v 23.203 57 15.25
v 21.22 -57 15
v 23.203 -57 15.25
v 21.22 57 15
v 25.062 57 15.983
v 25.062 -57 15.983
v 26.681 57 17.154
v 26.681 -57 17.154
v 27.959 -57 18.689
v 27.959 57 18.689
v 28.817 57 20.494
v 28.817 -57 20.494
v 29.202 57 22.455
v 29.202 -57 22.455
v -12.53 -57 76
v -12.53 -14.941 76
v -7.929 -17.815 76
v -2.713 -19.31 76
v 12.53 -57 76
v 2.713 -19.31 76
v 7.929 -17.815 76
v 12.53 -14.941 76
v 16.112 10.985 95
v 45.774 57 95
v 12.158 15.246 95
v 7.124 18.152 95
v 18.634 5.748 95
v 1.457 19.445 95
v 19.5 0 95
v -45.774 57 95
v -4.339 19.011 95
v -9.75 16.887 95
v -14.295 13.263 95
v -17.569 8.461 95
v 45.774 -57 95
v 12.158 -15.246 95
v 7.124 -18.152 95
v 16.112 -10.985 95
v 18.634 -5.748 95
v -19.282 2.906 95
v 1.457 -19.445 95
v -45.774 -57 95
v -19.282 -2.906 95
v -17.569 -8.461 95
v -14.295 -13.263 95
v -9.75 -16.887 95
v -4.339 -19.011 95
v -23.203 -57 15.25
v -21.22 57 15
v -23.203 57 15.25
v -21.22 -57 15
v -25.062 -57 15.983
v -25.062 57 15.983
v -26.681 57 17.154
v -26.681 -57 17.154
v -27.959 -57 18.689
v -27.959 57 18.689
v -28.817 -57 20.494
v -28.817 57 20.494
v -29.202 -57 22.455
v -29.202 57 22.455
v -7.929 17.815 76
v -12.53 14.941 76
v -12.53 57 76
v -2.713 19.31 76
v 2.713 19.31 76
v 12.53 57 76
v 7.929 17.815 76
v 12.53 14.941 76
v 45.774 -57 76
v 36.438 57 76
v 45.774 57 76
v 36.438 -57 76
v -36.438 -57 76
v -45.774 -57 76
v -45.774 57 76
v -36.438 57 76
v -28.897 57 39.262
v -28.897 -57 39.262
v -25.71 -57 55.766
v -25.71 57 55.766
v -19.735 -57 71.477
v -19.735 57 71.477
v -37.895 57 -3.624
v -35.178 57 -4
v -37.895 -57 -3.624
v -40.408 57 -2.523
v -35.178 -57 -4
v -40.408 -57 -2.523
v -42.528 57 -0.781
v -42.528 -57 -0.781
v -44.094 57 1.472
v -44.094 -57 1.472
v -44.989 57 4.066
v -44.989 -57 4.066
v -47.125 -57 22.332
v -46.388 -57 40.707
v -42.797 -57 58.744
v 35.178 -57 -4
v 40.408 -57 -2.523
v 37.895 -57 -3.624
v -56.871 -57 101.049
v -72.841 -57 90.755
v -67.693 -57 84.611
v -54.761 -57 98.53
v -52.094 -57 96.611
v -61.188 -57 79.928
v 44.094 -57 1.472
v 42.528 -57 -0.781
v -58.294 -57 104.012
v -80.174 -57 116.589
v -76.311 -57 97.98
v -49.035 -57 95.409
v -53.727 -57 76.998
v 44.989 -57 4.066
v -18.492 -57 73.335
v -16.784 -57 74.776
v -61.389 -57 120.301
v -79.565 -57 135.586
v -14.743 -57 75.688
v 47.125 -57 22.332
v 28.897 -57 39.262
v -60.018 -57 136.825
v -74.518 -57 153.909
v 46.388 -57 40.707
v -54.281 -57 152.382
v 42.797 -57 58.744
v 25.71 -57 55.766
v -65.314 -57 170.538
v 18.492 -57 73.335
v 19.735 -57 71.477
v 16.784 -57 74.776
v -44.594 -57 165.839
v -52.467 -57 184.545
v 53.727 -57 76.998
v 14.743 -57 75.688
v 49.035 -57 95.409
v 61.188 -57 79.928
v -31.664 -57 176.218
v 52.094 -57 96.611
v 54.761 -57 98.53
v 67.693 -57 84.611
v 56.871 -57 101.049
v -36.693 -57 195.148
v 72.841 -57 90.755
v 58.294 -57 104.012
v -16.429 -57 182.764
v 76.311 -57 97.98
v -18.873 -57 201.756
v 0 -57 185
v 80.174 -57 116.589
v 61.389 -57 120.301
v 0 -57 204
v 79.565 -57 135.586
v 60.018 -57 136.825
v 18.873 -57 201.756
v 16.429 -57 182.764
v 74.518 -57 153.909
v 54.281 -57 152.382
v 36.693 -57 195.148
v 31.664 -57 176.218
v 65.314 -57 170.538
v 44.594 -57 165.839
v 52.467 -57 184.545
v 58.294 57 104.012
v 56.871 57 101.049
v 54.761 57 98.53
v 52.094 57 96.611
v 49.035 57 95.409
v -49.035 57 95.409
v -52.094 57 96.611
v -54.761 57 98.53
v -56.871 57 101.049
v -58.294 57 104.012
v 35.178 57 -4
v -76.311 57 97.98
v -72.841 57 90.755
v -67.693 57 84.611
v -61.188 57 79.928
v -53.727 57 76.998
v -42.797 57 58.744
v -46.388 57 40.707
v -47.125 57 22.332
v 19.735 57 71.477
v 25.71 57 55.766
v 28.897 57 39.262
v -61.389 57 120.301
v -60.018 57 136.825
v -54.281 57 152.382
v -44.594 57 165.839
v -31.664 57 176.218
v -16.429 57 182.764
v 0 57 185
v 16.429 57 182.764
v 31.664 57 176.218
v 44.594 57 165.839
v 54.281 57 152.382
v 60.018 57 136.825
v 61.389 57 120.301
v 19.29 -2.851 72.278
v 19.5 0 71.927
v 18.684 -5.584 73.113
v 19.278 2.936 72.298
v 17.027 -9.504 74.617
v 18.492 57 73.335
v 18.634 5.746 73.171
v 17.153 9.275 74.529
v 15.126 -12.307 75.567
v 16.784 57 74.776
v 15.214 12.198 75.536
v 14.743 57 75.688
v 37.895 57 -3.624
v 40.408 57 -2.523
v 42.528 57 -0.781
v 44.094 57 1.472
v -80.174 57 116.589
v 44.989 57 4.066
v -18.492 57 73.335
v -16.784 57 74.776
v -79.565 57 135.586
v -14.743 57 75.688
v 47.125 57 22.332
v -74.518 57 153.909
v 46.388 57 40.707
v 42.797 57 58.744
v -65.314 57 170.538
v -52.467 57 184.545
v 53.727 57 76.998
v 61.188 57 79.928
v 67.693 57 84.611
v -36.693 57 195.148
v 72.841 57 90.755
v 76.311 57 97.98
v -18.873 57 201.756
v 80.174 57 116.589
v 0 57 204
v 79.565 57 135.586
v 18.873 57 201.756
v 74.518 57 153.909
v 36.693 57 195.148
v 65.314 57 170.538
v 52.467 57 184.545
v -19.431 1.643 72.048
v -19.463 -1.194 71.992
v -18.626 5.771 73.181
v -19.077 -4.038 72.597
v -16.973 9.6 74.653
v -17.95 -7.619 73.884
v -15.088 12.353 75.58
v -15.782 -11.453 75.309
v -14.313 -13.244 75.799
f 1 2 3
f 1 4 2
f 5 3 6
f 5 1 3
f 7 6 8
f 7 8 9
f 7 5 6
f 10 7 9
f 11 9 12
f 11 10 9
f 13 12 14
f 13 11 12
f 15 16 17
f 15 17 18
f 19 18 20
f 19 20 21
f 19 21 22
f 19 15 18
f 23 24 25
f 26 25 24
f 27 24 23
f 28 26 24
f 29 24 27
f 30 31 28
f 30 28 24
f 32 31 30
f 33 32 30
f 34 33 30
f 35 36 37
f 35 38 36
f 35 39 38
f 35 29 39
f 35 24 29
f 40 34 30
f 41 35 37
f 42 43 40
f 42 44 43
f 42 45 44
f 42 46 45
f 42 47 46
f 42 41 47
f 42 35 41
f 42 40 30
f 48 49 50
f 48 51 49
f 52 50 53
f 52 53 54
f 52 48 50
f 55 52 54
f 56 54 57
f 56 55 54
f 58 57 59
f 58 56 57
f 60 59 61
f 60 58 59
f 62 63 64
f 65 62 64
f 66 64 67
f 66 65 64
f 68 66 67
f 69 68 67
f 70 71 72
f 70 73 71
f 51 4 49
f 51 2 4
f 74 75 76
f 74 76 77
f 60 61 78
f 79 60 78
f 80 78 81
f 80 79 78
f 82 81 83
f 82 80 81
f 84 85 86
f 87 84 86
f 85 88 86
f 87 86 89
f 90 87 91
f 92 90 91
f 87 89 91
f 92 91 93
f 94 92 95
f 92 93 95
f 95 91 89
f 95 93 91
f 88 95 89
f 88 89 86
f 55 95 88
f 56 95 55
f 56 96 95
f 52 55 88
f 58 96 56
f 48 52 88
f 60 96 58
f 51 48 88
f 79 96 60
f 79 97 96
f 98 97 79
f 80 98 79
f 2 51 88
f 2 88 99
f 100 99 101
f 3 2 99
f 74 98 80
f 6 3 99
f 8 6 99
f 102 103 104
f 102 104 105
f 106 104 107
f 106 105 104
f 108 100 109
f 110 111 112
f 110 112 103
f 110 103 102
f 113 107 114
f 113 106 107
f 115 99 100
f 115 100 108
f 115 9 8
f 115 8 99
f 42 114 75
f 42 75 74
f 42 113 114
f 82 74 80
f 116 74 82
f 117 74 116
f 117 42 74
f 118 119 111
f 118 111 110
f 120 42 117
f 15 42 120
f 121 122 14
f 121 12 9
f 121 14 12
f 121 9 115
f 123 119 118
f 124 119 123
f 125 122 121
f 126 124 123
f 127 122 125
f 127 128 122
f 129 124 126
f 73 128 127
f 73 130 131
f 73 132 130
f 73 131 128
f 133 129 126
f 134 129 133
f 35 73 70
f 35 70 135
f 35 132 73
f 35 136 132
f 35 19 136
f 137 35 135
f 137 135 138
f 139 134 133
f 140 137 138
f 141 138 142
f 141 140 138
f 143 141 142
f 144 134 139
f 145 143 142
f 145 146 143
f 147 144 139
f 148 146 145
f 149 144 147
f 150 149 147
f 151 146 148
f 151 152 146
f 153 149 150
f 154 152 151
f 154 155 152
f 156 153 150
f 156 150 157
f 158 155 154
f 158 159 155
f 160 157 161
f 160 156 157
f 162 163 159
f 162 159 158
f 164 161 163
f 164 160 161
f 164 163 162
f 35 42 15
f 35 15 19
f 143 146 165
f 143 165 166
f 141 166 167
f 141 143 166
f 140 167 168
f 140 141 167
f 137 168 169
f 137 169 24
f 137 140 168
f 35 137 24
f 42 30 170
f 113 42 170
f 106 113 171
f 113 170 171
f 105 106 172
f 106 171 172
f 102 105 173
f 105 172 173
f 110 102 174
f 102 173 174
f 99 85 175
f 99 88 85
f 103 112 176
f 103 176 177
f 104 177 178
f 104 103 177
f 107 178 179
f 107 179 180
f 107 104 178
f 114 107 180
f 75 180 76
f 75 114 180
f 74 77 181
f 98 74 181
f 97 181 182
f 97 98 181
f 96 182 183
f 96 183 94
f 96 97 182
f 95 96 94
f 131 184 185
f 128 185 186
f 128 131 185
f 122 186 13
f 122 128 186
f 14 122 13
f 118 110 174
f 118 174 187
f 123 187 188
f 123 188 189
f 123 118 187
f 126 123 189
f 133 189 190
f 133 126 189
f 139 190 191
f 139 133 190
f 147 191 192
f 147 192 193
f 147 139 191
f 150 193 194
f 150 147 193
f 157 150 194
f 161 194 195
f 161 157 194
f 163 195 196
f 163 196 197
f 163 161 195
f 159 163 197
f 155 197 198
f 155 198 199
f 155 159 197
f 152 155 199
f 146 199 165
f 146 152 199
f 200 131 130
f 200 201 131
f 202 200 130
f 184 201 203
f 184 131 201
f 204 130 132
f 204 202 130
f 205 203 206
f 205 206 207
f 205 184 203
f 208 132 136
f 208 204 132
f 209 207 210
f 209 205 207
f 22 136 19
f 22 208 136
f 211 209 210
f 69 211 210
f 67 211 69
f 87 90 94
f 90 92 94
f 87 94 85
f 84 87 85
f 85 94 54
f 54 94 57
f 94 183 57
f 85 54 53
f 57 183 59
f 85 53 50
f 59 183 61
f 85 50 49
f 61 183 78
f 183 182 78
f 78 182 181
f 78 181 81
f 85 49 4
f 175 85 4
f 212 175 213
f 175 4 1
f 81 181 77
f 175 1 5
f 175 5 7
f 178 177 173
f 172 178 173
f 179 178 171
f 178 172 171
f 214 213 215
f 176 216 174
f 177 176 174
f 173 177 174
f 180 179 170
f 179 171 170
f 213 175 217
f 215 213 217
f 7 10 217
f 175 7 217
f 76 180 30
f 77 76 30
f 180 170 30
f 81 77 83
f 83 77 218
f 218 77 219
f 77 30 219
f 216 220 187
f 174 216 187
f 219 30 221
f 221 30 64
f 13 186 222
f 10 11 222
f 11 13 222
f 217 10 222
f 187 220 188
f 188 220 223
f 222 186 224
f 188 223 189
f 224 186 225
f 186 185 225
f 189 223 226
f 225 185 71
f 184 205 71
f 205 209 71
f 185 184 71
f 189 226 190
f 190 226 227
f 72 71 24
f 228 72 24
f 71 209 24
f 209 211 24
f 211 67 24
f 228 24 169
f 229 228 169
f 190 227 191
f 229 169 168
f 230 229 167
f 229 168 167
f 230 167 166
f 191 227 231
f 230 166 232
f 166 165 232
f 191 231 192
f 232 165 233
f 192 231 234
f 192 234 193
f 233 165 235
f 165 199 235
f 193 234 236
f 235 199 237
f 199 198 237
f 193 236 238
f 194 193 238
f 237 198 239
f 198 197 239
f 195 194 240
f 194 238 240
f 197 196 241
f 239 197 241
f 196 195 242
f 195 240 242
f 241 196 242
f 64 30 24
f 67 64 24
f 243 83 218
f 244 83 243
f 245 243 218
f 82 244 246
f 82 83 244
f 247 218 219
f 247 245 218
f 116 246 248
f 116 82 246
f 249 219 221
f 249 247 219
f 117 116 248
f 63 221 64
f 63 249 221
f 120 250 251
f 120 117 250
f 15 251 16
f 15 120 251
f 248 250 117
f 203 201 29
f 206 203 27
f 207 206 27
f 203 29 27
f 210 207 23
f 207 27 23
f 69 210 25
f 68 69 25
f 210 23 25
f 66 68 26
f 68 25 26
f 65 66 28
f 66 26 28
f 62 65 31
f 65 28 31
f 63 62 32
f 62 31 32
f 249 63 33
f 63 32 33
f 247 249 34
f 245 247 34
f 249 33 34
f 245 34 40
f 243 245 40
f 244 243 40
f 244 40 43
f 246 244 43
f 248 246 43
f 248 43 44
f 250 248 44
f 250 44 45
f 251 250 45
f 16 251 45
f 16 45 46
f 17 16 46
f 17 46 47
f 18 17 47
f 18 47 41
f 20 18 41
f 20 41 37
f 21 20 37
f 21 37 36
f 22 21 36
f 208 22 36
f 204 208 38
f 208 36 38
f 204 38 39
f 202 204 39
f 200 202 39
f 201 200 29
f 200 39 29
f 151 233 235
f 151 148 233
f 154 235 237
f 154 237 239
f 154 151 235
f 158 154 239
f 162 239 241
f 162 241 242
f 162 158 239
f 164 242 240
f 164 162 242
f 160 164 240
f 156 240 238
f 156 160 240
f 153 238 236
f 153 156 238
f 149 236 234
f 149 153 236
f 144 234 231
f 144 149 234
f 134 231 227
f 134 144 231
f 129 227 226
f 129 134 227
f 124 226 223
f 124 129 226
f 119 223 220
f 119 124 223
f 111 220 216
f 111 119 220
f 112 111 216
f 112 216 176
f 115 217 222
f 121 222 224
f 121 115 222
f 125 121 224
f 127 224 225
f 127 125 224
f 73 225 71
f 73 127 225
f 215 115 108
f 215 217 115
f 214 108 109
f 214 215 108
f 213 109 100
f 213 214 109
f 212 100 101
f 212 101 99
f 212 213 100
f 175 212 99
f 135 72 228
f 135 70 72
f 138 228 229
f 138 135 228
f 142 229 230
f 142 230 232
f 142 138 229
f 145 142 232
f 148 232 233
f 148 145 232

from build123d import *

# Parameters (mm, degrees)
F1_DEPTH = 57
F2_R     = 10
F3_R     = 8
F4_R     = 19.5
F5_DEPTH = 23.0736274766


with BuildPart() as f1:
    # F0 (on Front) → F1 (new body, symmetric)
    with BuildSketch(Plane.XZ):
        with BuildLine():
            ThreePointArc((76.3113958567, 97.9800145677), (65.3139848131, 170.5380837413), (0, 204))
            ThreePointArc((0, 204), (-65.3139848131, 170.5380837413), (-76.3113958567, 97.9800145677))
            ThreePointArc((-76.3113958567, 97.9800145677), (-64.5868234444, 82.0664049994), (-45.774399408, 76))
            Line((-45.774399408, 76), (-36.437930815, 76))
            ThreePointArc((-36.437930815, 76), (-46.804780385, 36.5859685512), (-43.1011872895, -4))
            Line((-43.1011872895, -4), (43.1011872895, -4))
            ThreePointArc((43.1011872895, -4), (46.804780385, 36.5859685512), (36.437930815, 76))
            Line((36.437930815, 76), (45.774399408, 76))
            ThreePointArc((45.774399408, 76), (64.5868234444, 82.0664049994), (76.3113958567, 97.9800145677))
        make_face()
        with BuildLine():
            ThreePointArc((-28.4035311639, 15), (-27.8807773056, 46.3973285977), (-17.4047398621, 76))
            Line((-17.4047398621, 76), (17.4047398621, 76))
            ThreePointArc((17.4047398621, 76), (27.8807773056, 46.3973285977), (28.4035311639, 15))
            Line((28.4035311639, 15), (-28.4035311639, 15))
        make_face(mode=Mode.SUBTRACT)
        with BuildLine():
            ThreePointArc((-45.774399408, 95), (-53.4872363848, 97.4871432148), (-58.2941509783, 104.0115058422))
            ThreePointArc((-58.2941509783, 104.0115058422), (-49.8932465977, 159.4384966818), (0, 185))
            ThreePointArc((0, 185), (49.8932465977, 159.4384966818), (58.2941509783, 104.0115058422))
            ThreePointArc((58.2941509783, 104.0115058422), (53.4872363848, 97.4871432148), (45.774399408, 95))
            Line((45.774399408, 95), (-45.774399408, 95))
        make_face(mode=Mode.SUBTRACT)
    extrude(amount=F1_DEPTH, both=True)

    # F2
    f2_edges = [f1.edges().sort_by_distance(p)[0] for p in [
        (-43.101187, 0, -4),
        (43.101187, 0, -4),
    ]]
    fillet(f2_edges, radius=F2_R)

    # F3
    f3_edges = [f1.edges().sort_by_distance(p)[0] for p in [
        (-17.40474, 0, 76),
        (17.40474, 0, 76),
        (28.403531, 0, 15),
        (35.177601, 0, -4),
        (-28.403531, 0, 15),
    ]]
    fillet(f3_edges, radius=F3_R)

    # F4 (on face) → F5 (cut, through all)
    with BuildSketch(Plane.XY.offset(95)):
        Circle(F4_R)
    extrude(amount=-F5_DEPTH, mode=Mode.SUBTRACT)


solid = f1.part
